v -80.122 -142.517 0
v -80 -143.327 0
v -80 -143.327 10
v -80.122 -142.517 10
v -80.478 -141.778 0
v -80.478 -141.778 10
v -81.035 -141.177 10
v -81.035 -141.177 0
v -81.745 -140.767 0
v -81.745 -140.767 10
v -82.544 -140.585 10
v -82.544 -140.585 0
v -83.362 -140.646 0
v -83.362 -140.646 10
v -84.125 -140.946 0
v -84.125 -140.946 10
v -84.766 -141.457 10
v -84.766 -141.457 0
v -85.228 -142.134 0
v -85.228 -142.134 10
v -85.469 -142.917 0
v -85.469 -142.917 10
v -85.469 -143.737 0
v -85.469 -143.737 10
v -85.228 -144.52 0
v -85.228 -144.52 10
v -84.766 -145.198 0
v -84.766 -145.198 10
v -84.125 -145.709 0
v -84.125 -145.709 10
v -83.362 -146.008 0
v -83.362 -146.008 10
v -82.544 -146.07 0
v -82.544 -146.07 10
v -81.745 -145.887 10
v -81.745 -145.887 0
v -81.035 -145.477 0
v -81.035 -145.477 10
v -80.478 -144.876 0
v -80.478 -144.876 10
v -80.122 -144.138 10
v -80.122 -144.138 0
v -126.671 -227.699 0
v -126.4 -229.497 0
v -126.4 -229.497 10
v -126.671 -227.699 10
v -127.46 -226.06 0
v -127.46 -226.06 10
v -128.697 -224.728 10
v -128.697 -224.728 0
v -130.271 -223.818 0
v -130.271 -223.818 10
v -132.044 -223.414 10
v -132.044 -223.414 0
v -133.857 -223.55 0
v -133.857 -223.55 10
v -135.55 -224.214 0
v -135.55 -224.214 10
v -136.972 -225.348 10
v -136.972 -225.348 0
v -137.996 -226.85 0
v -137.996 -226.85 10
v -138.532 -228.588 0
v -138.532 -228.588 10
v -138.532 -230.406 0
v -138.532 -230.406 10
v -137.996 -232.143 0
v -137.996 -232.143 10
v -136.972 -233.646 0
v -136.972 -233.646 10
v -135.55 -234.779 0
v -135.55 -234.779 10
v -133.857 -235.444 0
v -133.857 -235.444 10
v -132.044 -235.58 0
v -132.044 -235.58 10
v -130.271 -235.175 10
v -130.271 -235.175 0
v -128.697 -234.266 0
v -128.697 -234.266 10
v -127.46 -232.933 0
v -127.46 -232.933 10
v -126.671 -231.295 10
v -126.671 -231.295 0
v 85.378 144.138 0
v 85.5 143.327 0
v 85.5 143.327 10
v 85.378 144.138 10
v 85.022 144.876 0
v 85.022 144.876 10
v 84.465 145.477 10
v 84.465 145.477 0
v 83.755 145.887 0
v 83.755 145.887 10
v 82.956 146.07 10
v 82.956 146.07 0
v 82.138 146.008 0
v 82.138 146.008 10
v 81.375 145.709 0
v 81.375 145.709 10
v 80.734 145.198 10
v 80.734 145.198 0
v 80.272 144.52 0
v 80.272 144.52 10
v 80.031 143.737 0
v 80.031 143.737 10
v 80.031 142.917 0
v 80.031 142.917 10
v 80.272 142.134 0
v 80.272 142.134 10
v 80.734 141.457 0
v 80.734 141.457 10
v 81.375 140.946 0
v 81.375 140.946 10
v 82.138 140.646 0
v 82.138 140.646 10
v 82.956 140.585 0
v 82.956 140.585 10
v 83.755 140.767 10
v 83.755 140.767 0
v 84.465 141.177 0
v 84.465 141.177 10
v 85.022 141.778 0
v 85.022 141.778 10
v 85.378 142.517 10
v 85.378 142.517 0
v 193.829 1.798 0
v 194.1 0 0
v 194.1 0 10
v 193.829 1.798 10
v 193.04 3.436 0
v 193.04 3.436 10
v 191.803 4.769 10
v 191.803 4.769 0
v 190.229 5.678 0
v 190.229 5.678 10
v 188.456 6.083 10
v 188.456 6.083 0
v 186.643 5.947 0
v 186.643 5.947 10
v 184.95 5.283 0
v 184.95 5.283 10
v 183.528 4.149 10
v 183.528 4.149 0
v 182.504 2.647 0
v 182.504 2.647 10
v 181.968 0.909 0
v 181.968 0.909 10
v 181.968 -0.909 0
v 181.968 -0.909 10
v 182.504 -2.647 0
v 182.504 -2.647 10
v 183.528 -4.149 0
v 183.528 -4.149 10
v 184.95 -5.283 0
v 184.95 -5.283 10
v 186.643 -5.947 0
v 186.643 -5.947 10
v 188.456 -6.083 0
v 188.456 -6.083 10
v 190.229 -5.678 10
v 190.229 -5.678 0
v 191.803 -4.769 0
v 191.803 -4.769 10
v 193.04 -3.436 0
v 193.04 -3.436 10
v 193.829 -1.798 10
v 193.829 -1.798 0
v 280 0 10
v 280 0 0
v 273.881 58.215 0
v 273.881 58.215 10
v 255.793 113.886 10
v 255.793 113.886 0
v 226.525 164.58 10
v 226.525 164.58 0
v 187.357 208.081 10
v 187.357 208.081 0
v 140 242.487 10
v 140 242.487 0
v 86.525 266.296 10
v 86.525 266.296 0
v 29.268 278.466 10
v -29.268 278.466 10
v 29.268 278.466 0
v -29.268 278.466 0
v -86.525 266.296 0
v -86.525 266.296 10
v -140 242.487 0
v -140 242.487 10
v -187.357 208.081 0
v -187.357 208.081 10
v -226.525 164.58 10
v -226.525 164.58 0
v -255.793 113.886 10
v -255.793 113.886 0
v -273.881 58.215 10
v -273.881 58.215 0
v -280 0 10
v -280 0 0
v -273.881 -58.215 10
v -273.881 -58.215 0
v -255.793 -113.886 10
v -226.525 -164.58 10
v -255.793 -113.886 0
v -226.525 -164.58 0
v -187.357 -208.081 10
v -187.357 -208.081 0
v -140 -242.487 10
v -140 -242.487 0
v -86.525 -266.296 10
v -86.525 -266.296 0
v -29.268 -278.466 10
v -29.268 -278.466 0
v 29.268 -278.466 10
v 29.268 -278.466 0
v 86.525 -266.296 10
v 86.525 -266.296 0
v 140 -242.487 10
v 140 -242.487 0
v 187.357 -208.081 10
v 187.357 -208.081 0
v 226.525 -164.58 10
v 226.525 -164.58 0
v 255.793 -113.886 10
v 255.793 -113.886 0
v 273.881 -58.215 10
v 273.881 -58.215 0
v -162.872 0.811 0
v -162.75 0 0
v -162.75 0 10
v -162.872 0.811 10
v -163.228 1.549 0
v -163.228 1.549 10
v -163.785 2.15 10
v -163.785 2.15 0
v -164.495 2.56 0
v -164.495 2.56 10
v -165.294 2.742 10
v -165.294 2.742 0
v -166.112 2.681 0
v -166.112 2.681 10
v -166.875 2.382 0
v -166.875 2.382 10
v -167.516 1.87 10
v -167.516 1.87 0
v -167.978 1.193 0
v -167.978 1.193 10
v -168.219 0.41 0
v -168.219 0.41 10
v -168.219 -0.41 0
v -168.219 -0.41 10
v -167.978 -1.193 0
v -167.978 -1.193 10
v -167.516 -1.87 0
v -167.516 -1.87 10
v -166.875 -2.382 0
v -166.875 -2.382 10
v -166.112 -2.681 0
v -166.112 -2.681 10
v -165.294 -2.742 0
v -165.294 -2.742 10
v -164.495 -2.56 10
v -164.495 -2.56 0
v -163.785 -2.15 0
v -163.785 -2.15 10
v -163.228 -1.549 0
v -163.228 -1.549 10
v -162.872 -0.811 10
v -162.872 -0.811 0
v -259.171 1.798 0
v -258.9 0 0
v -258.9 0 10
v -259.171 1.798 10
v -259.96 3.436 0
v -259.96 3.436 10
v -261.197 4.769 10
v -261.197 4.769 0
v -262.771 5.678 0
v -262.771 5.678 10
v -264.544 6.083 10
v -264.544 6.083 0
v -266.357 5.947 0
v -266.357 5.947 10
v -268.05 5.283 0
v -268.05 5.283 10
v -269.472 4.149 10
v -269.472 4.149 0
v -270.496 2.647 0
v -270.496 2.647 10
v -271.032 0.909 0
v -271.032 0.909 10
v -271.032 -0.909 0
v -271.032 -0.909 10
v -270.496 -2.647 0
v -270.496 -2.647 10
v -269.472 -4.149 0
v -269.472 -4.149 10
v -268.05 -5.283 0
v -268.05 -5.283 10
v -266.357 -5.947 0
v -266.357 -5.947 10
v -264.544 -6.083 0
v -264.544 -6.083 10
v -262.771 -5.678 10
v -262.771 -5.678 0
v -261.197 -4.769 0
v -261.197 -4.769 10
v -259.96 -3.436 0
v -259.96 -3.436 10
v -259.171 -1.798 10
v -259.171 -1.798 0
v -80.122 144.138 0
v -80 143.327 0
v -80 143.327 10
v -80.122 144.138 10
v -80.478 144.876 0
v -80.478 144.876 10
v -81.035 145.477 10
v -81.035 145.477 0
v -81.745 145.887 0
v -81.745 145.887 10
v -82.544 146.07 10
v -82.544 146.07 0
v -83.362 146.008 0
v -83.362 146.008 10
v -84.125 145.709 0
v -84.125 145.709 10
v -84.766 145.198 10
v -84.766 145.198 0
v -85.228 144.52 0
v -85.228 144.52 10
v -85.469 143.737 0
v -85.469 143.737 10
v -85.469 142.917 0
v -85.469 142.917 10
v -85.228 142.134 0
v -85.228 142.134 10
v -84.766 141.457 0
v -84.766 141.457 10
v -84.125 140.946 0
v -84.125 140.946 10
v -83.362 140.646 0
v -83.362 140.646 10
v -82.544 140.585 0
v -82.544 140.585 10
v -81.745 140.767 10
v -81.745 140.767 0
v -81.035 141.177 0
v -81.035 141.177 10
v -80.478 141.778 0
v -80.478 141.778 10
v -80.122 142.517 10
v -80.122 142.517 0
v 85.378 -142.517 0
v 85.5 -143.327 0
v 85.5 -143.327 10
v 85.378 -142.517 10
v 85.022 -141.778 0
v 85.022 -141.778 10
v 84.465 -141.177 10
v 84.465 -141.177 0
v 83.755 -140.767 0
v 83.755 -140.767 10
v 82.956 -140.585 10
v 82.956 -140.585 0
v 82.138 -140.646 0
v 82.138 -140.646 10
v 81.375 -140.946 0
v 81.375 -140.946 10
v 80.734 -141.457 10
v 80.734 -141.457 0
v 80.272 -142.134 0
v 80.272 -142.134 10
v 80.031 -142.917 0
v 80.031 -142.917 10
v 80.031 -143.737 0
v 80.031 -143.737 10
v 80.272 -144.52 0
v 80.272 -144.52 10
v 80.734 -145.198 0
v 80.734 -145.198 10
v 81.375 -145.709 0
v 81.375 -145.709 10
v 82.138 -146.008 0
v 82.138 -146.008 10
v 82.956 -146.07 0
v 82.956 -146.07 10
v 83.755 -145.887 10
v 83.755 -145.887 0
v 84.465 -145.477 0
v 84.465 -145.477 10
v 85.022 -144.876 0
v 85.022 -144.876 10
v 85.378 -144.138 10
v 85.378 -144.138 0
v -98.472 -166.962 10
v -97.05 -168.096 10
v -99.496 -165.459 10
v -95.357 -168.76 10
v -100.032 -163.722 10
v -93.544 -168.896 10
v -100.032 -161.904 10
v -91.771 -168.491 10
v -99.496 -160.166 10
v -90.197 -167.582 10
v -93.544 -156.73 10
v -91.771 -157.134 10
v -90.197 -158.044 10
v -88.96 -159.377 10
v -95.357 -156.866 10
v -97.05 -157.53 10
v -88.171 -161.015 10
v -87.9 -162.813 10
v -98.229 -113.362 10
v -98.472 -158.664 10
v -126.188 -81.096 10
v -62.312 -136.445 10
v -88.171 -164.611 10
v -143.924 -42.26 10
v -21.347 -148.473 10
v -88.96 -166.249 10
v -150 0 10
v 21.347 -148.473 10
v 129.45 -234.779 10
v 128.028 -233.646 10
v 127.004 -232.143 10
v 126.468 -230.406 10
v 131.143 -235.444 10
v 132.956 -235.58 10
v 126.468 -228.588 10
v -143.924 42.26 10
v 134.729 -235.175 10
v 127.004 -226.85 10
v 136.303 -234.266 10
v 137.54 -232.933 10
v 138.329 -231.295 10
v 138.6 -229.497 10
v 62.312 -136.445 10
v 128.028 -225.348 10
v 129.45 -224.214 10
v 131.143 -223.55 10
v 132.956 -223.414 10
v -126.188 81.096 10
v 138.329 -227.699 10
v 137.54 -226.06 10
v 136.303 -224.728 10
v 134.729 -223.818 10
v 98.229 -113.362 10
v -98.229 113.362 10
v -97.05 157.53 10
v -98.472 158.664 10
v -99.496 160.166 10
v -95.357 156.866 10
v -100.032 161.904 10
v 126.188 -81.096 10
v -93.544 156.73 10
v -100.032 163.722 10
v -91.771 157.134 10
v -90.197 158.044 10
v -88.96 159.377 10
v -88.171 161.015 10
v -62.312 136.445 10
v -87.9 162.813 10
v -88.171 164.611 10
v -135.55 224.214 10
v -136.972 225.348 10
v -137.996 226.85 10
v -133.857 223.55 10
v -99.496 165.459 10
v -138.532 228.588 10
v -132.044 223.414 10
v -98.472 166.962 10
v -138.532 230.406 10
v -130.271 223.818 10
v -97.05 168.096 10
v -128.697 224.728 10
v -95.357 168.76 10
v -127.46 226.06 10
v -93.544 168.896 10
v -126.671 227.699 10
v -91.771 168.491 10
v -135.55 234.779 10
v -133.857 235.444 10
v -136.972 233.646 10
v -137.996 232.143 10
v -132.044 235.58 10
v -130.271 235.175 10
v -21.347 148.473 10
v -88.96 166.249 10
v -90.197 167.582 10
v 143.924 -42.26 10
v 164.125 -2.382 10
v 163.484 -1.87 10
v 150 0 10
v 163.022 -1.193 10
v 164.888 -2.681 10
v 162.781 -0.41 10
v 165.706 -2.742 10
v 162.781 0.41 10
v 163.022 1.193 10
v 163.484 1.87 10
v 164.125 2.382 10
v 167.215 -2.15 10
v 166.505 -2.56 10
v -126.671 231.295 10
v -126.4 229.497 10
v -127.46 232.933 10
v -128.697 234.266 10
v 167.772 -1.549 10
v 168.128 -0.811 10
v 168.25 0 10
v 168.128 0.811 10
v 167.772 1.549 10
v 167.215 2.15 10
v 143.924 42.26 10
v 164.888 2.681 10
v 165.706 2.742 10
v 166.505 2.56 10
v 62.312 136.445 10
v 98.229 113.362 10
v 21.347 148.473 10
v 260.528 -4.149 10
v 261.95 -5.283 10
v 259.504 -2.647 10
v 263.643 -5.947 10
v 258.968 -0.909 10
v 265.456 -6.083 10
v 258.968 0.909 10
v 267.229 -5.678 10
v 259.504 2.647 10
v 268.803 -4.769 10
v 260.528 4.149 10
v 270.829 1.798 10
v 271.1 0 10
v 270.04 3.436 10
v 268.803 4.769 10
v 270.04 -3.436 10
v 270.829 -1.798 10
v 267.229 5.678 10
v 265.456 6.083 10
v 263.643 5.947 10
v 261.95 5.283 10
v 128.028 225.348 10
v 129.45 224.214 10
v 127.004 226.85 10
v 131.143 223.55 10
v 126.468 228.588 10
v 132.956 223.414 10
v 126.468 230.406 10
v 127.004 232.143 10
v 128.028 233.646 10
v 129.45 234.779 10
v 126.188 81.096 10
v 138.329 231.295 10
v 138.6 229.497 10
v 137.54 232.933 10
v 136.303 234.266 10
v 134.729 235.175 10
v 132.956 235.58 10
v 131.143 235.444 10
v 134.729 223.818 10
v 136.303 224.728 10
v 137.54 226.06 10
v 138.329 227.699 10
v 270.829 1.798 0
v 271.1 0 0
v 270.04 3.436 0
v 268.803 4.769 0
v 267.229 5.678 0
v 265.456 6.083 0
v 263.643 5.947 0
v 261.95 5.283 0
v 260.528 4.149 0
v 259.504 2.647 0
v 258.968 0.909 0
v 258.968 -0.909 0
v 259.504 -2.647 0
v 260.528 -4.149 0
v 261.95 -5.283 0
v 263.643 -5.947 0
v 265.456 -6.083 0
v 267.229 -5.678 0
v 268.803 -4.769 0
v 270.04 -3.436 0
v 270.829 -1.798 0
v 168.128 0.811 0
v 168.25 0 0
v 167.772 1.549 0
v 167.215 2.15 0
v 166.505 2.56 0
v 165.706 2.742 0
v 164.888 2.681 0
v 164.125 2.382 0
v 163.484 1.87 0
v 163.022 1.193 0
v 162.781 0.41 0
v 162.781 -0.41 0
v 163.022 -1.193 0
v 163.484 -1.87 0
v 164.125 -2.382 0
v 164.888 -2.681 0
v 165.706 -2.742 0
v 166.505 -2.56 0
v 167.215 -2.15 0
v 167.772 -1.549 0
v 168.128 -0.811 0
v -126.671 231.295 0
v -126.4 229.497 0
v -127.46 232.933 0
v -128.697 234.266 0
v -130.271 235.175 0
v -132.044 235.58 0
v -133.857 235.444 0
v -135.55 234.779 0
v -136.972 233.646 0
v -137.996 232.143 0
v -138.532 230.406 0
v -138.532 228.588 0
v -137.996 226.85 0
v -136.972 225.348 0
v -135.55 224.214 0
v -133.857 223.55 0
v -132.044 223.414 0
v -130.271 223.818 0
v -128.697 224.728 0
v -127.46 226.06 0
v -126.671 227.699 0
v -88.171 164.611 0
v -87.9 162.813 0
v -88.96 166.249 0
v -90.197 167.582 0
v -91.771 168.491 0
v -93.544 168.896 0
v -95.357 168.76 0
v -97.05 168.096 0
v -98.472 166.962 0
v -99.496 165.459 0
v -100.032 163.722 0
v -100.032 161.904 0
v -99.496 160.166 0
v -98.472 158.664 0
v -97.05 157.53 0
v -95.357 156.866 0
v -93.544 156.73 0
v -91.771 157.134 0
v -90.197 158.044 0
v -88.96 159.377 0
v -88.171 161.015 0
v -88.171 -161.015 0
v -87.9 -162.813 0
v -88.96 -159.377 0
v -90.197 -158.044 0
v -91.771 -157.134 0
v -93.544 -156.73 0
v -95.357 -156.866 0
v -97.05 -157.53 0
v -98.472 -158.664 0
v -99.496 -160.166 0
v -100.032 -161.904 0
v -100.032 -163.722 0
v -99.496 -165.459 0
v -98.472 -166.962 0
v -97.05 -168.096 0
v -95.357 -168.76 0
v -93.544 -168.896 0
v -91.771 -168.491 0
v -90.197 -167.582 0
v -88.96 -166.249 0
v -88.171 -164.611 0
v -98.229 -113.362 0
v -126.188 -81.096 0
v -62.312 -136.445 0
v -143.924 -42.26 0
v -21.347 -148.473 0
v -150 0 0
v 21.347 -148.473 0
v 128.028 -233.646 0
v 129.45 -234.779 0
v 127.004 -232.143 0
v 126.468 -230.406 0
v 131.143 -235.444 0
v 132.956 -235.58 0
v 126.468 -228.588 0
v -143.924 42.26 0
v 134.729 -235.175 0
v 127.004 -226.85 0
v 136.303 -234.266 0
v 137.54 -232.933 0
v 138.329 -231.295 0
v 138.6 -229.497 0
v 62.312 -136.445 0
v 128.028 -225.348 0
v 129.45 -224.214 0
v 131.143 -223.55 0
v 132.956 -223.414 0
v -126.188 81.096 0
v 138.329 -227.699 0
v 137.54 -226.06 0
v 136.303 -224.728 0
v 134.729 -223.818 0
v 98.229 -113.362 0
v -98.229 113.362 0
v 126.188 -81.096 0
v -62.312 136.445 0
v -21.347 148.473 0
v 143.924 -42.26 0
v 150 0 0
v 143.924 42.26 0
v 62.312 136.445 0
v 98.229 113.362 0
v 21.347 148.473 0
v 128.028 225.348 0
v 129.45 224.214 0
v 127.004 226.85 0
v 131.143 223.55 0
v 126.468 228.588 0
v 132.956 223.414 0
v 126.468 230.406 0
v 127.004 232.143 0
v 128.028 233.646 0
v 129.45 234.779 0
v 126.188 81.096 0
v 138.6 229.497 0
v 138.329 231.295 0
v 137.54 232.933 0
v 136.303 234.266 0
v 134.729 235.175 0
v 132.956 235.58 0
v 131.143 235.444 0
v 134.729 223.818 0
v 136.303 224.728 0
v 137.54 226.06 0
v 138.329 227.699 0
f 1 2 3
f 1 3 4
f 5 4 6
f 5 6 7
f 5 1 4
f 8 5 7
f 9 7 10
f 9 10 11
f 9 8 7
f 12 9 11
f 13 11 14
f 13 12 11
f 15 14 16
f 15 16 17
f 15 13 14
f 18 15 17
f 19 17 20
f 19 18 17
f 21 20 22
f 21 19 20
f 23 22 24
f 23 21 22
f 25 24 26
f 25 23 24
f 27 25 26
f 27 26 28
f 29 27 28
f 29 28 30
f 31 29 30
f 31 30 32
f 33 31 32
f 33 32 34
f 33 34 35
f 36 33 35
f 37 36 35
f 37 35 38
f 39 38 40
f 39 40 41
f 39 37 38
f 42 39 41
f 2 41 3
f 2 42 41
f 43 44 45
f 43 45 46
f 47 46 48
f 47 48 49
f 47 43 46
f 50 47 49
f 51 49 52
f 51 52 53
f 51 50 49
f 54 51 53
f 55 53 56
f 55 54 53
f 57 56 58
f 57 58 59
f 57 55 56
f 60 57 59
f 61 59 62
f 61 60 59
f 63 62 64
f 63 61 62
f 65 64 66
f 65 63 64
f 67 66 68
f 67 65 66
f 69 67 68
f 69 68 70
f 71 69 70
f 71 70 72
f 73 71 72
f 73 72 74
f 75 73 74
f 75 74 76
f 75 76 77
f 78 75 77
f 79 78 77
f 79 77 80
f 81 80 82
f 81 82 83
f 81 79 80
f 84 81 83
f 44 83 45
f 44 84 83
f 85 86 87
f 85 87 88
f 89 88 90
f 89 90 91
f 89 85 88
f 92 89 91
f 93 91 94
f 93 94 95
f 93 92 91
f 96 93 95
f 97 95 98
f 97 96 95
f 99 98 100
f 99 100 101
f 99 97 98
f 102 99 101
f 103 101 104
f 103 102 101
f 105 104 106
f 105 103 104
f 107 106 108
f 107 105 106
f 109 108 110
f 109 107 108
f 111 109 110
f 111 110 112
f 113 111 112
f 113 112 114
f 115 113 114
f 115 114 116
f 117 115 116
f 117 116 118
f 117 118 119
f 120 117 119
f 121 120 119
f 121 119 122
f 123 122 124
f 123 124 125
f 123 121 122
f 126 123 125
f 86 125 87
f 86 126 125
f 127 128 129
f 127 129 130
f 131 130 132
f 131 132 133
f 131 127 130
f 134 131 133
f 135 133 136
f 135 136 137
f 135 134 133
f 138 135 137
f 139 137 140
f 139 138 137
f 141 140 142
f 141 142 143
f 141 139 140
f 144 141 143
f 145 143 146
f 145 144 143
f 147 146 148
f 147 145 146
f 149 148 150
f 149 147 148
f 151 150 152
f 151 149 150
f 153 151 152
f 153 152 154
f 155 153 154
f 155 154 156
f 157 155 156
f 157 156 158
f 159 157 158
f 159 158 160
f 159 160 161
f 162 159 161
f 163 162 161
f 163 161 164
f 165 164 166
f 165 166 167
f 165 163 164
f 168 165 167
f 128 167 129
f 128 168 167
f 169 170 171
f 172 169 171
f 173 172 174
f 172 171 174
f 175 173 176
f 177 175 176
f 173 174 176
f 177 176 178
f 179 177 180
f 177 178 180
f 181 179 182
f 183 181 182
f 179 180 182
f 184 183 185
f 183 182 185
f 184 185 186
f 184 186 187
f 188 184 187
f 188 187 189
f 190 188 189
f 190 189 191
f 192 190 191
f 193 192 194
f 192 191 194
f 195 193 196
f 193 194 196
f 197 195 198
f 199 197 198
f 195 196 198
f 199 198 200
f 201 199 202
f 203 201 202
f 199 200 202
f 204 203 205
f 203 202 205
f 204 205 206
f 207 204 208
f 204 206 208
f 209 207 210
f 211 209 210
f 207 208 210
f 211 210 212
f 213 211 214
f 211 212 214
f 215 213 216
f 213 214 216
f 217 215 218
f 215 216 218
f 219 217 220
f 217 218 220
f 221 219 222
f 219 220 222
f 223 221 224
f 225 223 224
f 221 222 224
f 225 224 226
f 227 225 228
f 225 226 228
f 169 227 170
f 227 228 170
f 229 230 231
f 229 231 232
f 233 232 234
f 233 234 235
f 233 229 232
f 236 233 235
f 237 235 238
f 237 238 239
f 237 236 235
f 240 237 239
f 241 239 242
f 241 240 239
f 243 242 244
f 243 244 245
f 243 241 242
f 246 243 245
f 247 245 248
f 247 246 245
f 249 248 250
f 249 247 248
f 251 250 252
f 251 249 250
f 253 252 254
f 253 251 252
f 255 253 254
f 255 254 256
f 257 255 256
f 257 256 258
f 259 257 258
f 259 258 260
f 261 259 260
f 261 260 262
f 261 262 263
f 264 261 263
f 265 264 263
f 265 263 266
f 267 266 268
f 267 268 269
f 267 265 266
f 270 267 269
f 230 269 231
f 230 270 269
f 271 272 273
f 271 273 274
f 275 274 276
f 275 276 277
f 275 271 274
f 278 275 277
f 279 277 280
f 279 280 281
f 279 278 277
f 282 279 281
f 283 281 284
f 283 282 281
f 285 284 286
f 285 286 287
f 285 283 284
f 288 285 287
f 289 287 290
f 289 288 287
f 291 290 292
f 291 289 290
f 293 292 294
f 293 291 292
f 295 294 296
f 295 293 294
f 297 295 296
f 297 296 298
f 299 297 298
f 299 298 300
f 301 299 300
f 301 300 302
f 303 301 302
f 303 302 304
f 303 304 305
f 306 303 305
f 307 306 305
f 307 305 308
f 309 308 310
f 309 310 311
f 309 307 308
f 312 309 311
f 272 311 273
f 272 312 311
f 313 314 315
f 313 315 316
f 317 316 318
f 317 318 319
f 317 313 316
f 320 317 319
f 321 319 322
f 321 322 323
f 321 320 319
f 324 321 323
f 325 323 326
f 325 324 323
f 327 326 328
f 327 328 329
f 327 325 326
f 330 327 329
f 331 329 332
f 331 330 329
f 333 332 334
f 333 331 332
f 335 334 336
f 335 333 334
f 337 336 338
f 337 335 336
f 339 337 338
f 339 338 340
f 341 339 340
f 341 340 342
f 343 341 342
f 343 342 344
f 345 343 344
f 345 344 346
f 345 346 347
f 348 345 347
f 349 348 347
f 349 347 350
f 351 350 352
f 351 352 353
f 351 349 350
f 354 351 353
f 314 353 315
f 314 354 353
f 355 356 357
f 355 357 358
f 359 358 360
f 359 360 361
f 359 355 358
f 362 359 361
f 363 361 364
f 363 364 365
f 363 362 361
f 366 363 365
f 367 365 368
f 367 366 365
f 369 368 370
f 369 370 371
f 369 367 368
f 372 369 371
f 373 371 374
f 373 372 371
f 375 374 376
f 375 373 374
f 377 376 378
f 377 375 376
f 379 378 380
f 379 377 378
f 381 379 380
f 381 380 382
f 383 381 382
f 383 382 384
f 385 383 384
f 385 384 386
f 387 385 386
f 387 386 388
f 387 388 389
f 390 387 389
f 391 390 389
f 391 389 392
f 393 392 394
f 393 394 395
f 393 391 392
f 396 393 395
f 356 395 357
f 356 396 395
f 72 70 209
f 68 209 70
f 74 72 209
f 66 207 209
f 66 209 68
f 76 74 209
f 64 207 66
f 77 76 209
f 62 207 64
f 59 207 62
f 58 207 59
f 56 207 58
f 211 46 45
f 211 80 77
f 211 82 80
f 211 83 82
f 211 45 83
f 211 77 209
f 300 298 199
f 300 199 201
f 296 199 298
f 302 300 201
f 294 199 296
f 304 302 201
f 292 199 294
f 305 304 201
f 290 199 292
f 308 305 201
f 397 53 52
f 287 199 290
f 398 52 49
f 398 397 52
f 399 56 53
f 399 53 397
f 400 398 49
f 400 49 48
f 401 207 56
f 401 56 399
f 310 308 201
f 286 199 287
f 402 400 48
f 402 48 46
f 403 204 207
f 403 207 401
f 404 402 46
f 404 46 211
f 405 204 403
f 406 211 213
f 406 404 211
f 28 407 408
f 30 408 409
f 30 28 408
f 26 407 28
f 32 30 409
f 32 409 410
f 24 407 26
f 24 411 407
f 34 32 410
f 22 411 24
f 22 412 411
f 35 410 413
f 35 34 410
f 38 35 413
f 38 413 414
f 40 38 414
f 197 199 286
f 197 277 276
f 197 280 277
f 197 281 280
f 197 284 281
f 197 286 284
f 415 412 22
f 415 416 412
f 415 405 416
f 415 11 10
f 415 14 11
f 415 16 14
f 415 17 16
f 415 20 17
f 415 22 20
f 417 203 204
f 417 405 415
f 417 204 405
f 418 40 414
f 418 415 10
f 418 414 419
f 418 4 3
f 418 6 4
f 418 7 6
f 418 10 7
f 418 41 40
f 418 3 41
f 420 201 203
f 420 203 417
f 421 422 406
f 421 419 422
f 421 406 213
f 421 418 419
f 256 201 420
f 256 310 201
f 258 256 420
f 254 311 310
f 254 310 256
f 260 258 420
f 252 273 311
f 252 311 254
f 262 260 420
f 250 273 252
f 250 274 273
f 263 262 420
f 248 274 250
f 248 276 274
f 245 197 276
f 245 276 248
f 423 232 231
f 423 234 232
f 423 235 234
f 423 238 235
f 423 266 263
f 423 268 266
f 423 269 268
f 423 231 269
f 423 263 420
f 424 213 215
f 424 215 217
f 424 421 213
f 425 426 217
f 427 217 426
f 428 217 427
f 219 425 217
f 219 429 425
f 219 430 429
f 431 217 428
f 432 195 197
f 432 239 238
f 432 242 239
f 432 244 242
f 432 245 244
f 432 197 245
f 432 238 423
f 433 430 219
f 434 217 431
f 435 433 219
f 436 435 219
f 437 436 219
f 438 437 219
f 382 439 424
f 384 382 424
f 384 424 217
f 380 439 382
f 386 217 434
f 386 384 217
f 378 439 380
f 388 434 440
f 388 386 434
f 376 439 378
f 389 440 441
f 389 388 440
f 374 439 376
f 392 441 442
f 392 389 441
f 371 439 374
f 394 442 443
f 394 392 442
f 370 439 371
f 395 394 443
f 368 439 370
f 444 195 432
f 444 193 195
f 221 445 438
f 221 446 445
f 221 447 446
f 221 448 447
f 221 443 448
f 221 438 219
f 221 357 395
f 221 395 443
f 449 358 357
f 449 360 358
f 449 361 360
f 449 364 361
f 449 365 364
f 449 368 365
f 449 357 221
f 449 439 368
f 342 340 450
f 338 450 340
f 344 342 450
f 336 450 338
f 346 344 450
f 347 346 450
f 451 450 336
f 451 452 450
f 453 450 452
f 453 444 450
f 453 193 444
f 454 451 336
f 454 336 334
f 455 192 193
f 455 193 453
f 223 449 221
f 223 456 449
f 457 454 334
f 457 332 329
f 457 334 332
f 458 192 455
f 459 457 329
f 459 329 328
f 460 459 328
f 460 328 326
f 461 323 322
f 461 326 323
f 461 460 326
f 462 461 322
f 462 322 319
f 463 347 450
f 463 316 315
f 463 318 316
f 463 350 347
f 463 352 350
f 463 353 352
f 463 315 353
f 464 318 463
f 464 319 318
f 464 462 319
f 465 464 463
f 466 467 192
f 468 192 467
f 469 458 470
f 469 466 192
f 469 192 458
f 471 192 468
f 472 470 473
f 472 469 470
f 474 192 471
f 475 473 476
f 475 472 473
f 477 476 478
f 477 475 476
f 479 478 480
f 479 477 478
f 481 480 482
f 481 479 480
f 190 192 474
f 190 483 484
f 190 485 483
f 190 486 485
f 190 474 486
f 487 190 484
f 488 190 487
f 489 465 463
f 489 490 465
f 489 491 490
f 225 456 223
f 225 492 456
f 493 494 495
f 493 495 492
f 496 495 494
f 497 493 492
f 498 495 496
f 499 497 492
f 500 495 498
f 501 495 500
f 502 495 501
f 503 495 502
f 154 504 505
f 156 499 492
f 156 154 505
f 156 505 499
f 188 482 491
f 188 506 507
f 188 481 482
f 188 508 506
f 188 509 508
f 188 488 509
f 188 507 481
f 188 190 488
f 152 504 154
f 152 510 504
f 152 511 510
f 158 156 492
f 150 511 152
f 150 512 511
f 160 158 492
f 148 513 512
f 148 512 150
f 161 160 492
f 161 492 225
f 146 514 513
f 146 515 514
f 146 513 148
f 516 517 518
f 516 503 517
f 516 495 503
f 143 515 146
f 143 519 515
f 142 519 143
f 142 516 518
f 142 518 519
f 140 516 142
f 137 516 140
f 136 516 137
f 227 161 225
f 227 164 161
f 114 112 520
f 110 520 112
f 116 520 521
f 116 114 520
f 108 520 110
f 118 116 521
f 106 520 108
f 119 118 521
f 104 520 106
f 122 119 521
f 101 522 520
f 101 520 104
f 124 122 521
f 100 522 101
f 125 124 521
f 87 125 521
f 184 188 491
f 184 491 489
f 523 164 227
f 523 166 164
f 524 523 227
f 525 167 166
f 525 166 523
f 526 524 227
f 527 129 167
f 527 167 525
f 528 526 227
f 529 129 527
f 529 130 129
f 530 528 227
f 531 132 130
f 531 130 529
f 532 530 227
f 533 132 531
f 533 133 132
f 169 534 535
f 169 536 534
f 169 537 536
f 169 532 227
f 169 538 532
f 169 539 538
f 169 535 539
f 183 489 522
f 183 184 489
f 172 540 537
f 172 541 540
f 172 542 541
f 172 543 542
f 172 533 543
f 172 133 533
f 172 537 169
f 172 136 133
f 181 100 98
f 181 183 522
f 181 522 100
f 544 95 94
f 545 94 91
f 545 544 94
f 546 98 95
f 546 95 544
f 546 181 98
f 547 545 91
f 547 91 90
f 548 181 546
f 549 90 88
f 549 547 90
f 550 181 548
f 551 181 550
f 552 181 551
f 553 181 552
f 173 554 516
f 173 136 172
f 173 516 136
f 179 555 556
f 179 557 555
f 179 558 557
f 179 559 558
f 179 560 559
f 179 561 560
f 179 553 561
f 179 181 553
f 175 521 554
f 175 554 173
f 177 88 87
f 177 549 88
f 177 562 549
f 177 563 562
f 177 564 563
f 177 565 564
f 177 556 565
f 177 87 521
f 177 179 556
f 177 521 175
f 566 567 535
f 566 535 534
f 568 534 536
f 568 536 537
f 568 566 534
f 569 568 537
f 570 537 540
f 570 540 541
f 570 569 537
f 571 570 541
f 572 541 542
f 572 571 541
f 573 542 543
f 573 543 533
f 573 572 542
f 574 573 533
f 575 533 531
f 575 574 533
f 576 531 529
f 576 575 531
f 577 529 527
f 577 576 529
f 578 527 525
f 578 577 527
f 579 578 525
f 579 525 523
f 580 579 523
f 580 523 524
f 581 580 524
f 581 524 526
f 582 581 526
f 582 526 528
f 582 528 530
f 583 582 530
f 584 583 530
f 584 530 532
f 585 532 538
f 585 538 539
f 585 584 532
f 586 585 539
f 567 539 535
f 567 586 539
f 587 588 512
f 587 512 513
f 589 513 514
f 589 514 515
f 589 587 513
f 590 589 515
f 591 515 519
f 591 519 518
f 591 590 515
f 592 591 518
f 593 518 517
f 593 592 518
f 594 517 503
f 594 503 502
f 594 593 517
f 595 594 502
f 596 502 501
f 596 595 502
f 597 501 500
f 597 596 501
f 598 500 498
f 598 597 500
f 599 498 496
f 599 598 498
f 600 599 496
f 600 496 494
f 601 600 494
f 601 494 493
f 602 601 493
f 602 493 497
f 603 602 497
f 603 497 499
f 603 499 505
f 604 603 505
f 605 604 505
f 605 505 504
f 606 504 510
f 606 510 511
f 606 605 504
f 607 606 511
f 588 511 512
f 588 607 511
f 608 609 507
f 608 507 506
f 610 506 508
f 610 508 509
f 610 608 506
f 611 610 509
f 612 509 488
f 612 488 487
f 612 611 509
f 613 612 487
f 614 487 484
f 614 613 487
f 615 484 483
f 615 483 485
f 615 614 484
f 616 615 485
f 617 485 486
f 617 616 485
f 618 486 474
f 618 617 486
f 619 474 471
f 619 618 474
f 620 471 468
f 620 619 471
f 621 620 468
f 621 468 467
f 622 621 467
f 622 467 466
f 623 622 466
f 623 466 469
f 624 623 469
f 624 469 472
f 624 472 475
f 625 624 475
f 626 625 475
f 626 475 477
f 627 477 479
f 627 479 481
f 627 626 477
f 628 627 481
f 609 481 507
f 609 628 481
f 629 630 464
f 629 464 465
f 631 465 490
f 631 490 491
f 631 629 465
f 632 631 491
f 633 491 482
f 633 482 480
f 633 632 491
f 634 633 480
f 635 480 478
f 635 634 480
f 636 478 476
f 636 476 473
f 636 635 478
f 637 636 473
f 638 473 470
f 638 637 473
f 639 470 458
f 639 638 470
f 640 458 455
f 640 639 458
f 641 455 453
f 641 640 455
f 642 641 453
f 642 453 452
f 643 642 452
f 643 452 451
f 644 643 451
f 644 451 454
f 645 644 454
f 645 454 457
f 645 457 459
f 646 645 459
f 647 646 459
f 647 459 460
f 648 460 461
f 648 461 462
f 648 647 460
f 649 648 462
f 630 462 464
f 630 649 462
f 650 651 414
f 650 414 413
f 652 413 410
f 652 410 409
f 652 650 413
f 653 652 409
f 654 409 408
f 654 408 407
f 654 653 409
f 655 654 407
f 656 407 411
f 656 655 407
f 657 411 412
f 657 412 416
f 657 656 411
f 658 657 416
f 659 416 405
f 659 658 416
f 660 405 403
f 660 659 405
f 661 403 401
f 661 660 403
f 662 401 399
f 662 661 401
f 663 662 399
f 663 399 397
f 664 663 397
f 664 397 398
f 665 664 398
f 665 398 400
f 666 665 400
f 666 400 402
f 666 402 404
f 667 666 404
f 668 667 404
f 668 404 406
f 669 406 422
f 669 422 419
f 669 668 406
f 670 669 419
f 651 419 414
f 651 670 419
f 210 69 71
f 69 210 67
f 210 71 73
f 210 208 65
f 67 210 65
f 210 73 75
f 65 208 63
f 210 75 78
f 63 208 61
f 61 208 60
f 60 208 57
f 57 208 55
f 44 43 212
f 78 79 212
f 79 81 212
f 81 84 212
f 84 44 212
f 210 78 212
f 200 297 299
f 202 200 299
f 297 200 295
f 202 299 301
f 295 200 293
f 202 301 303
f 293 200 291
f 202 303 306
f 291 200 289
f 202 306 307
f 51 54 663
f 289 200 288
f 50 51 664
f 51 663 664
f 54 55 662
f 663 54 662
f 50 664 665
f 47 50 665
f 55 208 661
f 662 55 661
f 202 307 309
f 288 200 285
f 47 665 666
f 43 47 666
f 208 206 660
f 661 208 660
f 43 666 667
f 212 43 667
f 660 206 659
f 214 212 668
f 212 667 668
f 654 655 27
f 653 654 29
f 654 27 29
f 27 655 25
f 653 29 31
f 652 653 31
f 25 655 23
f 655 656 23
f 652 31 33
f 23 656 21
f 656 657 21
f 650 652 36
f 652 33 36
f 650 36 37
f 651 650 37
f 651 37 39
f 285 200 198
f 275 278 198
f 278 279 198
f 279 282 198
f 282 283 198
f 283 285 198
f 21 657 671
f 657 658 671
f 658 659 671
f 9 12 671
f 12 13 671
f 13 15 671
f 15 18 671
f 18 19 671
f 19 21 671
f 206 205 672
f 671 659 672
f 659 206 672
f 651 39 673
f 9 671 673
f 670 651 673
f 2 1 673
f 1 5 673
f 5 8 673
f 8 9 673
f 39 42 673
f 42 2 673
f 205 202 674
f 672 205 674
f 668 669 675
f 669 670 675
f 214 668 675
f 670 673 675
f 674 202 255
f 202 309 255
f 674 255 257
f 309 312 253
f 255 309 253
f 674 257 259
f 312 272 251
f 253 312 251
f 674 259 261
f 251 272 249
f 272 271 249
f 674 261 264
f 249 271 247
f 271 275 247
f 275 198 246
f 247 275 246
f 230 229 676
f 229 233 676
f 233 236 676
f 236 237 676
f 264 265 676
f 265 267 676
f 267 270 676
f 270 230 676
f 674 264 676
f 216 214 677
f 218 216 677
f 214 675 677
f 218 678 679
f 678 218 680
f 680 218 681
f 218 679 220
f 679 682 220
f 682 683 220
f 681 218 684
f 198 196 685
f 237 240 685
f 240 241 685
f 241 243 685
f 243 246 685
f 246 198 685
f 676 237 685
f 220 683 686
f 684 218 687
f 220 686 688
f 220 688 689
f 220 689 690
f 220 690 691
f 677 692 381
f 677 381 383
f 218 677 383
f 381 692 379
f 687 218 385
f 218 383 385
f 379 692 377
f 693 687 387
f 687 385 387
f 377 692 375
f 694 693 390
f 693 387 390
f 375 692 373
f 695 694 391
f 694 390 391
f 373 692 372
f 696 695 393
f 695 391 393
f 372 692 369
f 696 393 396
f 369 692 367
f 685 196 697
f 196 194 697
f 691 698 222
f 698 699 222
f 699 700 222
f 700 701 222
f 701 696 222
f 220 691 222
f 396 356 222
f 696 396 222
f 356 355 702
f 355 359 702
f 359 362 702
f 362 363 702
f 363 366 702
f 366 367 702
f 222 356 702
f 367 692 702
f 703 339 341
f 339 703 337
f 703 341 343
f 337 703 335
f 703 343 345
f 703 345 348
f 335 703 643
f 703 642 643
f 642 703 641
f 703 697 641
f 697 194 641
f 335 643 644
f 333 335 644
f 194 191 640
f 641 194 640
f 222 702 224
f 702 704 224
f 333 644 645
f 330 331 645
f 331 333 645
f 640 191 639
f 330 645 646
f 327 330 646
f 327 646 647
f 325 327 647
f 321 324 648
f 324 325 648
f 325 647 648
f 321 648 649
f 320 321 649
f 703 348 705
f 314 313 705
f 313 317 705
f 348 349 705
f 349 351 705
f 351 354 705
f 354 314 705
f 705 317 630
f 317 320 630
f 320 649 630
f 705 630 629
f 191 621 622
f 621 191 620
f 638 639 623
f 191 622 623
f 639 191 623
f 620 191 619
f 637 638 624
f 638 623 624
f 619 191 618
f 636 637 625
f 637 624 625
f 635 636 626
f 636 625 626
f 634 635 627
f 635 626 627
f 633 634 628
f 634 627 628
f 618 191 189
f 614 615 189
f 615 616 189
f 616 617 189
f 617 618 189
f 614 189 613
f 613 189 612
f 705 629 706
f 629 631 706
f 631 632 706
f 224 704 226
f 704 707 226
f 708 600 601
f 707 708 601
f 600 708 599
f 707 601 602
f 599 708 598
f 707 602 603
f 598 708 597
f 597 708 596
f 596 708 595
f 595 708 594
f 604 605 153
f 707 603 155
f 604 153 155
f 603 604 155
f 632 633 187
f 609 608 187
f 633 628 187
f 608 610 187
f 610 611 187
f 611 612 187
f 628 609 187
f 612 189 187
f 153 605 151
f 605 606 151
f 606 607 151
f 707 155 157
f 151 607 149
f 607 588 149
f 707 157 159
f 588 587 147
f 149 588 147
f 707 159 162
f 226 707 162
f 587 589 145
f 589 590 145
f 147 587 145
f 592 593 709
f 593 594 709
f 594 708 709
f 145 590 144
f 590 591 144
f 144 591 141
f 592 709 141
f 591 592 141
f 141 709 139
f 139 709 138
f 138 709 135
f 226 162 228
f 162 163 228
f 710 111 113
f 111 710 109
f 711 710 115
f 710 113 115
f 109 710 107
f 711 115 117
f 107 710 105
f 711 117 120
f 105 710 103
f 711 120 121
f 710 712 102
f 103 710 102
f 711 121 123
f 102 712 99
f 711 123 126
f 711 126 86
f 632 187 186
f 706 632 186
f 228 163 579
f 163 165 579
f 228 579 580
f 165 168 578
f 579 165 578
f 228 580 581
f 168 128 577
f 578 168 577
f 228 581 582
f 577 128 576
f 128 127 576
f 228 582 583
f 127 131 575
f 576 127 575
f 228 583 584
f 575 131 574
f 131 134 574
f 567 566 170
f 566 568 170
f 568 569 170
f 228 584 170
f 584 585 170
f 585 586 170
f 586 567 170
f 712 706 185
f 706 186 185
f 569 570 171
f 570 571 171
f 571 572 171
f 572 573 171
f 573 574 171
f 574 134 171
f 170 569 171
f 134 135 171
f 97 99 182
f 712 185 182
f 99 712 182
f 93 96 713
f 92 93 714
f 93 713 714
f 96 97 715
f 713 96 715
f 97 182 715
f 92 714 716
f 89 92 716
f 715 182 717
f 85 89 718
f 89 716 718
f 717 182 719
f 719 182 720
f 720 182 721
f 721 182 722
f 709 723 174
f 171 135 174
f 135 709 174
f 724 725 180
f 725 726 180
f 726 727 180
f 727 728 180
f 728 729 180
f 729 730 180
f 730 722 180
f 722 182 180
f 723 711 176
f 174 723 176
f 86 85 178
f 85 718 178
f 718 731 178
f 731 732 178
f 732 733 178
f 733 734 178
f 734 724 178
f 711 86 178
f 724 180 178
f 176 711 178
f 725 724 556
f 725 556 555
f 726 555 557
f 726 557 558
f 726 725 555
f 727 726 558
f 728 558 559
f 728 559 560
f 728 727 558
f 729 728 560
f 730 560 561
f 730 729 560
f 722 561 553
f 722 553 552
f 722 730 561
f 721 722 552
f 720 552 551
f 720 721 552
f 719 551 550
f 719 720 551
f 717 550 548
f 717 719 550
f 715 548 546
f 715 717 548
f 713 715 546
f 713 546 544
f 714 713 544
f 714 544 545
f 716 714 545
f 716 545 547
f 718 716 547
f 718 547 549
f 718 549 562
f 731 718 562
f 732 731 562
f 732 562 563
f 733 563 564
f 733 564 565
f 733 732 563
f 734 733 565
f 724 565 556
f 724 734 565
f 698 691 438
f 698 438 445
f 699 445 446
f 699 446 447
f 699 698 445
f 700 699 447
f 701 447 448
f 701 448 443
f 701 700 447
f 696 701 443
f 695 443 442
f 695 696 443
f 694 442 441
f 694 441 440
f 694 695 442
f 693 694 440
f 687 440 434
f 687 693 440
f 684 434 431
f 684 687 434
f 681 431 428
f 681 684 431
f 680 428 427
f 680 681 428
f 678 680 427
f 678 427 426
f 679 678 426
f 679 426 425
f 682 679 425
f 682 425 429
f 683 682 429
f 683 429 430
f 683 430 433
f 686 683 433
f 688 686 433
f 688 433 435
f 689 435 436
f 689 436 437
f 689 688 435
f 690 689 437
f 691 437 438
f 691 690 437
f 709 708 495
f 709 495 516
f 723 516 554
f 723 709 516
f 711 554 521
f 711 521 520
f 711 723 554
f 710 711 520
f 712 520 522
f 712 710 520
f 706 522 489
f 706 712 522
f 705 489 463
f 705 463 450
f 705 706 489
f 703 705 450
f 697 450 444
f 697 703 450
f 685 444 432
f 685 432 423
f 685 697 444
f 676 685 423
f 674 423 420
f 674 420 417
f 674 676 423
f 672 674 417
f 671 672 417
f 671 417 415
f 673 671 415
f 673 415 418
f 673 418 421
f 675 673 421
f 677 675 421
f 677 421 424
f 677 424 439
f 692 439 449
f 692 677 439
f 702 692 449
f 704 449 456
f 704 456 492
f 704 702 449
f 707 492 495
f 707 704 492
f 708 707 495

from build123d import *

# Parameters (mm, degrees)
SKETCH_2_R      = 280
SKETCH_2_R_2    = 150
SKETCH_2_R_3    = 6.1
SKETCH_2_R_4    = 2.75
EXTRUDE_1_DEPTH = 10


with BuildPart() as part:
    # Эскиз2 → Бобышка-Вытянуть1 (new body)
    with BuildSketch(Plane(origin=(0, 0, 0), x_dir=(-1, 0, 0), z_dir=(0, 0, 1))):
        with Locations(Location((0, 0, 0), (0, 0, 180))):
            Circle(SKETCH_2_R)
        with Locations(Location((0, 0, 0), (0, 0, 180))):
            Circle(SKETCH_2_R_2, mode=Mode.SUBTRACT)
        with Locations(Location((-188, 0, 0), (0, 0, 180))):
            Circle(SKETCH_2_R_3, mode=Mode.SUBTRACT)
        with Locations(Location((-165.5, 0, 0), (0, 0, 180))):
            Circle(SKETCH_2_R_4, mode=Mode.SUBTRACT)
        with Locations(Location((-265, 0, 0), (0, 0, 180))):
            Circle(SKETCH_2_R_3, mode=Mode.SUBTRACT)
        with Locations(Location((-82.75, 143.327204326, 0), (0, 0, 180))):
            Circle(SKETCH_2_R_4, mode=Mode.SUBTRACT)
        with Locations(Location((82.75, 143.327204326, 0), (0, 0, 180))):
            Circle(SKETCH_2_R_4, mode=Mode.SUBTRACT)
        with Locations(Location((165.5, 0, 0), (0, 0, 180))):
            Circle(SKETCH_2_R_4, mode=Mode.SUBTRACT)
        with Locations(Location((82.75, -143.327204326, 0), (0, 0, 180))):
            Circle(SKETCH_2_R_4, mode=Mode.SUBTRACT)
        with Locations(Location((-82.75, -143.327204326, 0), (0, 0, 180))):
            Circle(SKETCH_2_R_4, mode=Mode.SUBTRACT)
        with Locations(Location((94, 162.812775911, 0), (0, 0, 180))):
            Circle(SKETCH_2_R_3, mode=Mode.SUBTRACT)
        with Locations(Location((94, -162.812775911, 0), (0, 0, 180))):
            Circle(SKETCH_2_R_3, mode=Mode.SUBTRACT)
        with Locations(Location((-132.5, 229.496732003, 0), (0, 0, 180))):
            Circle(SKETCH_2_R_3, mode=Mode.SUBTRACT)
        with Locations(Location((132.5, 229.496732003, 0), (0, 0, 180))):
            Circle(SKETCH_2_R_3, mode=Mode.SUBTRACT)
        with Locations(Location((265, 0, 0), (0, 0, 180))):
            Circle(SKETCH_2_R_3, mode=Mode.SUBTRACT)
        with Locations(Location((132.5, -229.496732003, 0), (0, 0, 180))):
            Circle(SKETCH_2_R_3, mode=Mode.SUBTRACT)
        with Locations(Location((-132.5, -229.496732003, 0), (0, 0, 180))):
            Circle(SKETCH_2_R_3, mode=Mode.SUBTRACT)
    extrude(amount=EXTRUDE_1_DEPTH)


solid = part.part
